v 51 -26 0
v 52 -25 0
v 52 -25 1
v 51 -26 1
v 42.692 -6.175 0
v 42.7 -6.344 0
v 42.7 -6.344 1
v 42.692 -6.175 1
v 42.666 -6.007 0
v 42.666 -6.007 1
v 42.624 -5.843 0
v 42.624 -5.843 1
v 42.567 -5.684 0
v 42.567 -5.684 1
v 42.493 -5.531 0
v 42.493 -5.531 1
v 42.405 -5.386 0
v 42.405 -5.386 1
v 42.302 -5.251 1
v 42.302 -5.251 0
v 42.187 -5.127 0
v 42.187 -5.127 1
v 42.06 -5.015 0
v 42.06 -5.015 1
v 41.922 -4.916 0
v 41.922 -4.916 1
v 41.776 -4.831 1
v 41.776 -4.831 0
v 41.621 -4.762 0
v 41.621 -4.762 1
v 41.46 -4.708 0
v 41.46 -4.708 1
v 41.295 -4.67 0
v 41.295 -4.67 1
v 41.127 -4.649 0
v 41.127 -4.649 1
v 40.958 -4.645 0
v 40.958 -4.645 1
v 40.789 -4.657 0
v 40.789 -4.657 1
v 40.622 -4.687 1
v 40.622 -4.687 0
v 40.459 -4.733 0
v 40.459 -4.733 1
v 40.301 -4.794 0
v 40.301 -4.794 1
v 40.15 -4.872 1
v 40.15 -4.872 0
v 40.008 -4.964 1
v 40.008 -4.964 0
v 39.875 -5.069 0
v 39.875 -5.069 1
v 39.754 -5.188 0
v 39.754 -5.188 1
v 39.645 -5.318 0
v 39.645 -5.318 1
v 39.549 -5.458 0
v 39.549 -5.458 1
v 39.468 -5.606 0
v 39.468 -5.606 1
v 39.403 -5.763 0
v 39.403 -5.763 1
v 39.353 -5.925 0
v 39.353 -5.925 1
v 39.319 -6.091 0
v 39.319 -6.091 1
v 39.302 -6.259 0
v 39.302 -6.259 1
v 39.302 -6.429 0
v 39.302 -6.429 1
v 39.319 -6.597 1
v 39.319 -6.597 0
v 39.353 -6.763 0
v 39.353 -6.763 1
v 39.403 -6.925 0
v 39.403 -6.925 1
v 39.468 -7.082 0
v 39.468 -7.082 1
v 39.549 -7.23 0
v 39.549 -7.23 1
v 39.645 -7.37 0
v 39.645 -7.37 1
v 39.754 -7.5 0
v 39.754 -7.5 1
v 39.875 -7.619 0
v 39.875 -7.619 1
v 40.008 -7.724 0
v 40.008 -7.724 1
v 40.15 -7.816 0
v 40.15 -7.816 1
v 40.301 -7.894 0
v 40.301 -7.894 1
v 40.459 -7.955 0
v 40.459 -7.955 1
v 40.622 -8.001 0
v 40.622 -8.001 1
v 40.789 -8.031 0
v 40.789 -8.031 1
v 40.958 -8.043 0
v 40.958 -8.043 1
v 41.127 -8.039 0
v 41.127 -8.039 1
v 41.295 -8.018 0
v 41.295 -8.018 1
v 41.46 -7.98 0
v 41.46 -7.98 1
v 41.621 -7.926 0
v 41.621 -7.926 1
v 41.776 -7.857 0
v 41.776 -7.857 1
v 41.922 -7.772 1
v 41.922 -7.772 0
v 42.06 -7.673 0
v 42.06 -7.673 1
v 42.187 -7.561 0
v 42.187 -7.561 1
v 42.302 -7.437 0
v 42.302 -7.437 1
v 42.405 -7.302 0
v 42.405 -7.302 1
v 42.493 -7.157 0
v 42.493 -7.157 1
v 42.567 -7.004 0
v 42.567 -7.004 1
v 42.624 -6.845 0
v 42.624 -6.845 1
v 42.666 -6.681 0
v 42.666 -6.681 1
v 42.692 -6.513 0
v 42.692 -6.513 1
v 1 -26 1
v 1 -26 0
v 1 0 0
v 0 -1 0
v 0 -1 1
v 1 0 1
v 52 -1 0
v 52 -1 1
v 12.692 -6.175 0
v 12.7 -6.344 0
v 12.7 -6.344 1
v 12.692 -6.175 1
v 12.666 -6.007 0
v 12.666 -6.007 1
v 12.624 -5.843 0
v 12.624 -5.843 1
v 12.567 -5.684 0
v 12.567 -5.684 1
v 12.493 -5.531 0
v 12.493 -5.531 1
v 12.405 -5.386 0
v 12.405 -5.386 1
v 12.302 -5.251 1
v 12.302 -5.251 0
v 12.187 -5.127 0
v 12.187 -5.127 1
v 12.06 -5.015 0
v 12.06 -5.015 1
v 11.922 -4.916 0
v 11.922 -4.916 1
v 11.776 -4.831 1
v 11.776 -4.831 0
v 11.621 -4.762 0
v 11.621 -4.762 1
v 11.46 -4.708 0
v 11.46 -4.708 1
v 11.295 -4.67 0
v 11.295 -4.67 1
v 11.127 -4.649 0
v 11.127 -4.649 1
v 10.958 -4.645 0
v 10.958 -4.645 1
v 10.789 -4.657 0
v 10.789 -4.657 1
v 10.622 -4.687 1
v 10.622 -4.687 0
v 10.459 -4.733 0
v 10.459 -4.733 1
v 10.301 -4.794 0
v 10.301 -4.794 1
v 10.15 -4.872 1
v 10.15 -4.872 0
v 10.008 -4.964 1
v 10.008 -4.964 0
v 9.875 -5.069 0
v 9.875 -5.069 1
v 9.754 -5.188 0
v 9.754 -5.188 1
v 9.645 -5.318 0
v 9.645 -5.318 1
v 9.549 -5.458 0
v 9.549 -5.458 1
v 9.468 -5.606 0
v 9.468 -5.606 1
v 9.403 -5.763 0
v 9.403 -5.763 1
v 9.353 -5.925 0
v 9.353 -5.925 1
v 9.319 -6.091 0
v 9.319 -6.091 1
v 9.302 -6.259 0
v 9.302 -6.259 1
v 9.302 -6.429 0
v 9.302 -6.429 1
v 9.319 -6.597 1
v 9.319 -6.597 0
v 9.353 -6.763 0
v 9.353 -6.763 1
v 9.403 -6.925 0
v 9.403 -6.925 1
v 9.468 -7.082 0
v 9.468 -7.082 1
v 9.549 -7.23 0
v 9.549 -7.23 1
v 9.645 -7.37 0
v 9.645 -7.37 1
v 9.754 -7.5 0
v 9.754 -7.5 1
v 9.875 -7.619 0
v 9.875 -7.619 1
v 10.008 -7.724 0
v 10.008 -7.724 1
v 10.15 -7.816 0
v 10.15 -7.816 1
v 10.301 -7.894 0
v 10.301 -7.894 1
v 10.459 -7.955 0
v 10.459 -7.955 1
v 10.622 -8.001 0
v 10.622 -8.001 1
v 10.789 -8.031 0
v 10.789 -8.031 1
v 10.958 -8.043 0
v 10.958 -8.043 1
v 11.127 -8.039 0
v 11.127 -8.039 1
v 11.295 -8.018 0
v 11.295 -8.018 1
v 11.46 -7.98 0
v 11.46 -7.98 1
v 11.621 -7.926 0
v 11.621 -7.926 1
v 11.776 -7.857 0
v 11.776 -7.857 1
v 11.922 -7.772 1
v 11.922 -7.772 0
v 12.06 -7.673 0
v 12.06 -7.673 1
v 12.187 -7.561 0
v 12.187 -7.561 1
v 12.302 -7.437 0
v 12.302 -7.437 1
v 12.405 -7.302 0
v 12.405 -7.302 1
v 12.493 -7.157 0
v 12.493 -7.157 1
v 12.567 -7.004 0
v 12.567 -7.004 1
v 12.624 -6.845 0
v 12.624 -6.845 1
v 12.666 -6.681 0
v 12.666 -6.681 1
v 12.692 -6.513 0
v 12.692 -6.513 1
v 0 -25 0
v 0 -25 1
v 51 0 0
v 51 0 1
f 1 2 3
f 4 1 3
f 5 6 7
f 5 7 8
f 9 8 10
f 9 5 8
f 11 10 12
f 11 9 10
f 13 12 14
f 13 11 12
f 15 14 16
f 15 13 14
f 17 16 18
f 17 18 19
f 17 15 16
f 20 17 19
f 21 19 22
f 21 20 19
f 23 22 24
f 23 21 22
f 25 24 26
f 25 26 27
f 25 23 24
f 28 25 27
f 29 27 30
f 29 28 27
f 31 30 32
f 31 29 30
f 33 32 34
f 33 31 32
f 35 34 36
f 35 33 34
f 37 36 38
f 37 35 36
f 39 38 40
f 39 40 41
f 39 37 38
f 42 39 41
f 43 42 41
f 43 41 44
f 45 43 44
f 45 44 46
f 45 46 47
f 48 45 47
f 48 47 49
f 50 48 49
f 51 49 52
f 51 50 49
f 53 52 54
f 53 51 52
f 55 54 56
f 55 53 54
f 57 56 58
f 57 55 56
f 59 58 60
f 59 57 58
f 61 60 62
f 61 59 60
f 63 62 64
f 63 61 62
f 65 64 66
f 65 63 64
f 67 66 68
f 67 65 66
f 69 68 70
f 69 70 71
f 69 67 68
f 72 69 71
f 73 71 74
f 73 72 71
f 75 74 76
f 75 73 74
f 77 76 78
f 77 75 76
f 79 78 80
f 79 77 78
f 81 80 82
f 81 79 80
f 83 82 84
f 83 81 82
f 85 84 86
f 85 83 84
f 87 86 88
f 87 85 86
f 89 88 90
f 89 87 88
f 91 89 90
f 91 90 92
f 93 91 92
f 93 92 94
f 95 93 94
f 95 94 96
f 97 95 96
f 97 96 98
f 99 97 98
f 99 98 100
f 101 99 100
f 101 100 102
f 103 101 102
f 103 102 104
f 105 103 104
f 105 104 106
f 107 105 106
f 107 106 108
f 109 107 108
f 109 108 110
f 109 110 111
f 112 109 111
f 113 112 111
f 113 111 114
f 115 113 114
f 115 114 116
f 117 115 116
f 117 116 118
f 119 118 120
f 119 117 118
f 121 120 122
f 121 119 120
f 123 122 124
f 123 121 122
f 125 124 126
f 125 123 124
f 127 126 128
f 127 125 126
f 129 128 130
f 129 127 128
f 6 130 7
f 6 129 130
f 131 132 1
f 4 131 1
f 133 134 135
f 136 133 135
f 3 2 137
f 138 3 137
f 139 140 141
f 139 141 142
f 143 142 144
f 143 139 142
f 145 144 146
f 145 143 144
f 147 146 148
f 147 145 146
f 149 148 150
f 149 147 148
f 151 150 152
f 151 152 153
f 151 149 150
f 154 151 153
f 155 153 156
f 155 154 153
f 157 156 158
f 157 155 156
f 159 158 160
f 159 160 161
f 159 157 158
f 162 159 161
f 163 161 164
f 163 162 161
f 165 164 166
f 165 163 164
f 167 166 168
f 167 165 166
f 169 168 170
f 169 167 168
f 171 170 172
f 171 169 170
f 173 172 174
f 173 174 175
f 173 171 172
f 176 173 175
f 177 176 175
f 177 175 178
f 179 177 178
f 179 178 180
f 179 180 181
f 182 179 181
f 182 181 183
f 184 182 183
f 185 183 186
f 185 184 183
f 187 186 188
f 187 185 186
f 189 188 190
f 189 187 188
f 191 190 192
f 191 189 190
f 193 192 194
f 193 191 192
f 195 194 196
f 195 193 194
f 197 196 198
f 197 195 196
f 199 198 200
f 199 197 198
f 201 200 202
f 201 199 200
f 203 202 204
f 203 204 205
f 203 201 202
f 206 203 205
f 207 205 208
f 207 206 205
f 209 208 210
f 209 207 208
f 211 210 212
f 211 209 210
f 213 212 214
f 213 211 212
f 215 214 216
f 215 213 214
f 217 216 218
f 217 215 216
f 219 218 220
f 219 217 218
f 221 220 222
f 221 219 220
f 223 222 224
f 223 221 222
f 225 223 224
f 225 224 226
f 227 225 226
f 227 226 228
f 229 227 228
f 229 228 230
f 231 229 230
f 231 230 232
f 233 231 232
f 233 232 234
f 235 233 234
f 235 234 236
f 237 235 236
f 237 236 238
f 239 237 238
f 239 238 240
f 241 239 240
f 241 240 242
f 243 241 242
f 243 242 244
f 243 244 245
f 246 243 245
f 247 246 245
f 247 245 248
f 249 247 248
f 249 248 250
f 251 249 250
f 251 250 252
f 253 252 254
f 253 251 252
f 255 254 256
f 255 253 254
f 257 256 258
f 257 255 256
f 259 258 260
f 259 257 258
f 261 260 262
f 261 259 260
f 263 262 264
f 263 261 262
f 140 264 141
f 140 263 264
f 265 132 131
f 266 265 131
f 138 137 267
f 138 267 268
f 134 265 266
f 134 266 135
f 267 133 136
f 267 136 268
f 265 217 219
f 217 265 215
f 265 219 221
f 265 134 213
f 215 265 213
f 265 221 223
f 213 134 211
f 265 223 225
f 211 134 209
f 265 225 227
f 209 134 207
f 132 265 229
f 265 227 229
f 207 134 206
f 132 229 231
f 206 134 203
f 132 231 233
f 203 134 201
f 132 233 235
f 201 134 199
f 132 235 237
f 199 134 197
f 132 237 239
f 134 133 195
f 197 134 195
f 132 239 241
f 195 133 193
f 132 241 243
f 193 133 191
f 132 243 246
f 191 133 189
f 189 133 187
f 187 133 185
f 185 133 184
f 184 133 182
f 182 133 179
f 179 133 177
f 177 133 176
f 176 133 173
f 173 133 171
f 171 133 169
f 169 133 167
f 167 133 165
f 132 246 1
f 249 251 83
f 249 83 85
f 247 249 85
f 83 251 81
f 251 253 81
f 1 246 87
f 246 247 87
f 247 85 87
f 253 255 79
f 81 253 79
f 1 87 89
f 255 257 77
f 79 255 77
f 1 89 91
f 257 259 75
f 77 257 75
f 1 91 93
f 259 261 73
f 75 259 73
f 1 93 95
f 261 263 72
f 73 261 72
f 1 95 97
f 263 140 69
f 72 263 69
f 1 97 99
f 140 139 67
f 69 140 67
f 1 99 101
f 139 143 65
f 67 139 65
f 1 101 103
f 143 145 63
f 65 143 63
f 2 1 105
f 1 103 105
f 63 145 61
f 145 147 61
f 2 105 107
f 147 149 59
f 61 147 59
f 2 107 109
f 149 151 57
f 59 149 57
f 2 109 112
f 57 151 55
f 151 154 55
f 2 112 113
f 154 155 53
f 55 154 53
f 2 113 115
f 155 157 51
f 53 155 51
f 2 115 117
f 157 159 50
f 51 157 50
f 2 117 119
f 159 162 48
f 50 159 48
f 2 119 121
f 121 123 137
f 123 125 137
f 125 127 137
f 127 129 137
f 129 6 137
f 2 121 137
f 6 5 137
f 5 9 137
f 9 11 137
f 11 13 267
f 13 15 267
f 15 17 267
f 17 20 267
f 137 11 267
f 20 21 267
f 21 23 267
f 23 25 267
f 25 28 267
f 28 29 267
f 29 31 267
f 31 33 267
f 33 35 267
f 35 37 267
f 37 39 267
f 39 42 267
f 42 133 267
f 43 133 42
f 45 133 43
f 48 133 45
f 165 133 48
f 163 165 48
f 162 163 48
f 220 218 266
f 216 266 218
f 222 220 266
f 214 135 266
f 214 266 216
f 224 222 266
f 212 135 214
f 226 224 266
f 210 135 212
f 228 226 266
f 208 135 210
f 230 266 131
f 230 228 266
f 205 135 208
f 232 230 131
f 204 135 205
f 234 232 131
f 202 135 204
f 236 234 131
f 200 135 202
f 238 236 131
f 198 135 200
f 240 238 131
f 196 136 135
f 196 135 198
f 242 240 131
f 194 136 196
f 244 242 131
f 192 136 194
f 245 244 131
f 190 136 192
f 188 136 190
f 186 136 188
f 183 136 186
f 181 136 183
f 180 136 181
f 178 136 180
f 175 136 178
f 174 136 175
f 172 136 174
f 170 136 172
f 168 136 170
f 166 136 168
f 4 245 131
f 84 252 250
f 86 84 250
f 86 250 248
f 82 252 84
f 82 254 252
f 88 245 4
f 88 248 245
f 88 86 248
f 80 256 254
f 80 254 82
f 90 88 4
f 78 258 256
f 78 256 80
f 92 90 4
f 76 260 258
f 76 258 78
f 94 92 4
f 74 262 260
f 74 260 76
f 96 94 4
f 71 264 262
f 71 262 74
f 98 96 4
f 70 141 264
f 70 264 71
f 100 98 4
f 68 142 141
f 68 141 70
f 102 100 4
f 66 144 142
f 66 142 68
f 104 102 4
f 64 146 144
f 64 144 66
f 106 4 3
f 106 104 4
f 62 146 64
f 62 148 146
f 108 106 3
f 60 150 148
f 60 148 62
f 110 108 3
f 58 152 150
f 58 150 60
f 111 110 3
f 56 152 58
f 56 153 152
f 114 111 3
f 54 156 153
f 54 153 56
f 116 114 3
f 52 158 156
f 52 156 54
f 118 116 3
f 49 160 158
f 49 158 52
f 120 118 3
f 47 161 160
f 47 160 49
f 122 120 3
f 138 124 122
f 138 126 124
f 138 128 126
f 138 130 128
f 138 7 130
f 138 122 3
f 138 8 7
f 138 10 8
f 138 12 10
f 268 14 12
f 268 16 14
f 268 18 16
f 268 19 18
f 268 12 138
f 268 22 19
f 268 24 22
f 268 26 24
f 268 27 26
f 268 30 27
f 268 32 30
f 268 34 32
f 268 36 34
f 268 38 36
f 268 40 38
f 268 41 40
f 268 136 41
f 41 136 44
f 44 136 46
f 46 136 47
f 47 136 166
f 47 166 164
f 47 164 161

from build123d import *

# Parameters (mm, degrees)
SKETCH1_W           = 52
SKETCH1_H           = 26
SKETCH1_R           = 1.7
BOSS_EXTRUDE1_DEPTH = 1
CHAMFER1_SIZE       = 1


with BuildPart() as part:
    # Sketch1 → Boss-Extrude1 (new body)
    with BuildSketch(Plane.XY):
        with Locations((26, -13)):
            Rectangle(SKETCH1_W, SKETCH1_H)
        with Locations((11, -6.344)):
            Circle(SKETCH1_R, mode=Mode.SUBTRACT)
        with Locations((41, -6.344)):
            Circle(SKETCH1_R, mode=Mode.SUBTRACT)
    extrude(amount=BOSS_EXTRUDE1_DEPTH)

    # Chamfer1
    chamfer1_edges = [part.edges().sort_by_distance(p)[0] for p in [
        (0, 0, 0.5),
        (52, 0, 0.5),
        (52, -26, 0.5),
        (0, -26, 0.5),
    ]]
    chamfer(chamfer1_edges, length=CHAMFER1_SIZE)


solid = part.part
